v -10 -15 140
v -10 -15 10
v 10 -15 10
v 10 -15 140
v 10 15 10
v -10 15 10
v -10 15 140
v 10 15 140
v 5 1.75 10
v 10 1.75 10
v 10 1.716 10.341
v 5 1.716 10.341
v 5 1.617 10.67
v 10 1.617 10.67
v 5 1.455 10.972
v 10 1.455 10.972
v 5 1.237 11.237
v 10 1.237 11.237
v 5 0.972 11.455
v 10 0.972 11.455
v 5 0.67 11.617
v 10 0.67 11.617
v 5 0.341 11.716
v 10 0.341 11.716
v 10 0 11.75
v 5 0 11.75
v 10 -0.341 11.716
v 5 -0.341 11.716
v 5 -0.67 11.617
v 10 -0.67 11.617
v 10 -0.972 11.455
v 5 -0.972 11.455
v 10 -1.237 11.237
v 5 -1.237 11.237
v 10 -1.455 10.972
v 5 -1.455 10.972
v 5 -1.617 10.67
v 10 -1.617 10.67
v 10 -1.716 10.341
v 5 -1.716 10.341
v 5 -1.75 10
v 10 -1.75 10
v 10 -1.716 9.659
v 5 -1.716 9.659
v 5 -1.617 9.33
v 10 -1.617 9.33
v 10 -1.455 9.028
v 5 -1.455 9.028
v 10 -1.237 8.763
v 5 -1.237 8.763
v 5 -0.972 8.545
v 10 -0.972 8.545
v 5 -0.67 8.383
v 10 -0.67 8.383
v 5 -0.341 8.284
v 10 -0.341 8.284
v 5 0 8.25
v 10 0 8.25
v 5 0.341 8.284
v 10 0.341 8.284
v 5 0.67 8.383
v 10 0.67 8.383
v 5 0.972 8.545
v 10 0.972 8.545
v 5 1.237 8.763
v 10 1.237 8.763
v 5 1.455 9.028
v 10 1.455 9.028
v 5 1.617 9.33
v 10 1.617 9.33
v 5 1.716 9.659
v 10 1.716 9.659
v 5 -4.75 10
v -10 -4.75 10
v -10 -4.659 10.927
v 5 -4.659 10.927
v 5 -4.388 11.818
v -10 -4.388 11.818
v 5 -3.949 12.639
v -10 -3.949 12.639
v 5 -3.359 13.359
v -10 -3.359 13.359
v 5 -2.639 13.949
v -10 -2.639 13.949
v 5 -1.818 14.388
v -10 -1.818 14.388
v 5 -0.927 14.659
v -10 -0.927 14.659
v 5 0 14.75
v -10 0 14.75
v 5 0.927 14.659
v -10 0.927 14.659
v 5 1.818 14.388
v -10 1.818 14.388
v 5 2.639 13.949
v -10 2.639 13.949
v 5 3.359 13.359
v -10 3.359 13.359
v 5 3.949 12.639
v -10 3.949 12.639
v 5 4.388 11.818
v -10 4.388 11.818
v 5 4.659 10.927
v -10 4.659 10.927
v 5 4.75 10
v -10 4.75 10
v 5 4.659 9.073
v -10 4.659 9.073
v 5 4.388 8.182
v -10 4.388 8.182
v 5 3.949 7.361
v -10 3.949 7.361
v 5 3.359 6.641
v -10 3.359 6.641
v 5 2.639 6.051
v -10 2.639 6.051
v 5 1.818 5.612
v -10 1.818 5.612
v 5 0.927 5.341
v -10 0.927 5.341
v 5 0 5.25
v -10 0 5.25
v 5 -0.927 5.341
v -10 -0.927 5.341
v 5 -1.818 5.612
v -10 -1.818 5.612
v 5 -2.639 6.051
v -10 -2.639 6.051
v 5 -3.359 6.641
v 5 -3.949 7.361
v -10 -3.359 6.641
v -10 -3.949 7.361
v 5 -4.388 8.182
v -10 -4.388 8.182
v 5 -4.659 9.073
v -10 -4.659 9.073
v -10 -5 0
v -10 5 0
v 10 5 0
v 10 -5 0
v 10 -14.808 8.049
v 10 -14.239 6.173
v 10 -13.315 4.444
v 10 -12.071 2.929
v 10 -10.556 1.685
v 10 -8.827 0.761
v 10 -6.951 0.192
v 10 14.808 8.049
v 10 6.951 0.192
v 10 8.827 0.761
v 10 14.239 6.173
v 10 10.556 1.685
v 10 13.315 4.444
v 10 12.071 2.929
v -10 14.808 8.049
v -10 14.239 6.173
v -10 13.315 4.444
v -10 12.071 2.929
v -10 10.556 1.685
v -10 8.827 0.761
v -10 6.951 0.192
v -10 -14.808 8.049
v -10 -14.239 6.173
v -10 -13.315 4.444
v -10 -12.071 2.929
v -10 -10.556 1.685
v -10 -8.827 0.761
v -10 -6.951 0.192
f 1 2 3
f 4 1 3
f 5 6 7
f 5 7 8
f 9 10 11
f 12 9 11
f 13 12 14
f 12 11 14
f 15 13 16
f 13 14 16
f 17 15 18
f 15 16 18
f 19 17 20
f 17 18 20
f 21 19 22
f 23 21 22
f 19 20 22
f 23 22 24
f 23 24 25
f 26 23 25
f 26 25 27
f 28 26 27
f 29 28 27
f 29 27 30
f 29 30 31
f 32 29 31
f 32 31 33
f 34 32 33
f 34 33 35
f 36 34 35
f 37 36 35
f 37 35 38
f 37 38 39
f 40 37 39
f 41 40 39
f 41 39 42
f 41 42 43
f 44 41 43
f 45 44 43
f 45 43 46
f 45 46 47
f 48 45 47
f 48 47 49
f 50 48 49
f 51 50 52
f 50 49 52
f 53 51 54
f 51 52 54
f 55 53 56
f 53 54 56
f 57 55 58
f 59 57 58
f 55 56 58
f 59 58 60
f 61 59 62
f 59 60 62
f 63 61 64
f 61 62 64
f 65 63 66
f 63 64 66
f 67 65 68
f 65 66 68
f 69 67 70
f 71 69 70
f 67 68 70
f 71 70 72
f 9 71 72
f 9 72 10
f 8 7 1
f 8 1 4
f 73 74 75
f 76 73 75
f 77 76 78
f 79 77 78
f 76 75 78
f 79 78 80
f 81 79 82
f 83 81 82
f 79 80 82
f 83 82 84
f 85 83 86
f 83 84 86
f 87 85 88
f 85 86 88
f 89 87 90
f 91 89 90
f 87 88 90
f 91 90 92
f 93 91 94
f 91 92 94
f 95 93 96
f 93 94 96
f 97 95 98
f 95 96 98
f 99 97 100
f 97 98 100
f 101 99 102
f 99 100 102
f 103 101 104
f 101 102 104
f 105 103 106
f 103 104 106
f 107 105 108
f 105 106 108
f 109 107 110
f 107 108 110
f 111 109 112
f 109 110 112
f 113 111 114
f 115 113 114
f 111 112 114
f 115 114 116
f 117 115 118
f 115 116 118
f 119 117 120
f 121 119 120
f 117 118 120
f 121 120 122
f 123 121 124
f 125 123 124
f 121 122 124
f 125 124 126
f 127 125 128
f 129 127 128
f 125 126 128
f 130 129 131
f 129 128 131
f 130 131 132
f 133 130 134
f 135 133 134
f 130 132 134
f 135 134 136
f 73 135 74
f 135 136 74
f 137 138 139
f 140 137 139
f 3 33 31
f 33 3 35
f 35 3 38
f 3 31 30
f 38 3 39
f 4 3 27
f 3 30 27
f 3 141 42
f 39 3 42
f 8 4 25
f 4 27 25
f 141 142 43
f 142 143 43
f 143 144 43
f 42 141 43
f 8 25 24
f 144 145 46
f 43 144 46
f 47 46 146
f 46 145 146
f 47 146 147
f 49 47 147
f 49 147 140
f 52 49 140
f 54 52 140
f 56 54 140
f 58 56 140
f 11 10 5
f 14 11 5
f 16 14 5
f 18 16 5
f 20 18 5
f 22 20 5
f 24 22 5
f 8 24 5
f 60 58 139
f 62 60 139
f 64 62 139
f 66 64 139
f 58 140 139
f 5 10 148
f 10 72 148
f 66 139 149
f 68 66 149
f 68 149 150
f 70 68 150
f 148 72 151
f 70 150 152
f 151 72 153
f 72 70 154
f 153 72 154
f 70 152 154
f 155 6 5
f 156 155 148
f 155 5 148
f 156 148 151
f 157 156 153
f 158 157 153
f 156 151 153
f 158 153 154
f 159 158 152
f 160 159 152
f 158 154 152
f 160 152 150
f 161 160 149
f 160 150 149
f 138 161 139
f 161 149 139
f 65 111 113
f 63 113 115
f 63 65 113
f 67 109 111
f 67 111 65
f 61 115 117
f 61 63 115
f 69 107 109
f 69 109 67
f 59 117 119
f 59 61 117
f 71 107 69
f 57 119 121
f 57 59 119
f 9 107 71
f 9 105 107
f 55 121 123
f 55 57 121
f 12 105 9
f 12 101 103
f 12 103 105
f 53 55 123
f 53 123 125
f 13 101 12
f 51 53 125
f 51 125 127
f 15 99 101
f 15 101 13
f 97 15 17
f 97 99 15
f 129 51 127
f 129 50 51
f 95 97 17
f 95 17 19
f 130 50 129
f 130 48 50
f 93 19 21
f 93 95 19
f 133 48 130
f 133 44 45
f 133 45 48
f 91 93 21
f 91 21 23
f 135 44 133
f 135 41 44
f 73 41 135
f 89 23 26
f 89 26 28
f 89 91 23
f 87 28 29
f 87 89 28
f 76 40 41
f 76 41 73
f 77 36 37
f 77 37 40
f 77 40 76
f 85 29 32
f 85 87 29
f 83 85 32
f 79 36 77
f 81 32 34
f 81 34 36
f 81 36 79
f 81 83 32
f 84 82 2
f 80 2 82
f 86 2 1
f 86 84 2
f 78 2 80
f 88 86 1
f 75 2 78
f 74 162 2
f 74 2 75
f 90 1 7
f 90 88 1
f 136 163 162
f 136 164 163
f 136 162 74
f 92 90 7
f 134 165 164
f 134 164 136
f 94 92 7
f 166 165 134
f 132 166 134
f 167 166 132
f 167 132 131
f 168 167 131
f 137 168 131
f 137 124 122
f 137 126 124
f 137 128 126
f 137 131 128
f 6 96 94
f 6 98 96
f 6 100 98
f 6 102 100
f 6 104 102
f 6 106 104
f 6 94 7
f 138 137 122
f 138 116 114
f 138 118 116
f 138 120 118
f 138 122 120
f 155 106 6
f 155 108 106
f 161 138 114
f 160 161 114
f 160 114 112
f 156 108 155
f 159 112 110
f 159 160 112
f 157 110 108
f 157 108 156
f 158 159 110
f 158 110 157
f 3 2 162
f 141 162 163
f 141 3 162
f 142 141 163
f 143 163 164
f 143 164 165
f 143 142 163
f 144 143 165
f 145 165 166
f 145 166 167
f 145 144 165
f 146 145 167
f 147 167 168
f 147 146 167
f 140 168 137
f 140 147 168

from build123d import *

# Parameters (mm, degrees)
SKETCH1_W           = 20
SKETCH1_H           = 30
BOSS_EXTRUDE1_DEPTH = 140
FILLET1_R           = 10
SKETCH2_R           = 1.75
CUT_EXTRUDE1_DEPTH  = 143.214626533
SKETCH3_R           = 4.75
CUT_EXTRUDE2_DEPTH  = 15


with BuildPart() as part:
    # Sketch1 → Boss-Extrude1 (new body)
    with BuildSketch(Plane.XY):
        Rectangle(SKETCH1_W, SKETCH1_H)
    extrude(amount=BOSS_EXTRUDE1_DEPTH)

    # Fillet1
    fillet1_edges = [part.edges().sort_by_distance(p)[0] for p in [
        (0, -15, 0),
        (0, 15, 0),
    ]]
    fillet(fillet1_edges, radius=FILLET1_R)

    # Sketch2 → Cut-Extrude1 (cut, through all)
    with BuildSketch(Plane(origin=(10, 0, 0), x_dir=(0, 0, -1), z_dir=(1, 0, 0))):
        with Locations(Location((-10, 0, 0), (0, 0, 90))):
            Circle(SKETCH2_R)
    extrude(amount=-CUT_EXTRUDE1_DEPTH, mode=Mode.SUBTRACT)

    # Sketch3 → Cut-Extrude2 (cut)
    with BuildSketch(Plane.ZY.offset(10)):
        with Locations(Location((10, 0, 0), (0, 0, 270))):
            Circle(SKETCH3_R)
    extrude(amount=-CUT_EXTRUDE2_DEPTH, mode=Mode.SUBTRACT)


solid = part.part
